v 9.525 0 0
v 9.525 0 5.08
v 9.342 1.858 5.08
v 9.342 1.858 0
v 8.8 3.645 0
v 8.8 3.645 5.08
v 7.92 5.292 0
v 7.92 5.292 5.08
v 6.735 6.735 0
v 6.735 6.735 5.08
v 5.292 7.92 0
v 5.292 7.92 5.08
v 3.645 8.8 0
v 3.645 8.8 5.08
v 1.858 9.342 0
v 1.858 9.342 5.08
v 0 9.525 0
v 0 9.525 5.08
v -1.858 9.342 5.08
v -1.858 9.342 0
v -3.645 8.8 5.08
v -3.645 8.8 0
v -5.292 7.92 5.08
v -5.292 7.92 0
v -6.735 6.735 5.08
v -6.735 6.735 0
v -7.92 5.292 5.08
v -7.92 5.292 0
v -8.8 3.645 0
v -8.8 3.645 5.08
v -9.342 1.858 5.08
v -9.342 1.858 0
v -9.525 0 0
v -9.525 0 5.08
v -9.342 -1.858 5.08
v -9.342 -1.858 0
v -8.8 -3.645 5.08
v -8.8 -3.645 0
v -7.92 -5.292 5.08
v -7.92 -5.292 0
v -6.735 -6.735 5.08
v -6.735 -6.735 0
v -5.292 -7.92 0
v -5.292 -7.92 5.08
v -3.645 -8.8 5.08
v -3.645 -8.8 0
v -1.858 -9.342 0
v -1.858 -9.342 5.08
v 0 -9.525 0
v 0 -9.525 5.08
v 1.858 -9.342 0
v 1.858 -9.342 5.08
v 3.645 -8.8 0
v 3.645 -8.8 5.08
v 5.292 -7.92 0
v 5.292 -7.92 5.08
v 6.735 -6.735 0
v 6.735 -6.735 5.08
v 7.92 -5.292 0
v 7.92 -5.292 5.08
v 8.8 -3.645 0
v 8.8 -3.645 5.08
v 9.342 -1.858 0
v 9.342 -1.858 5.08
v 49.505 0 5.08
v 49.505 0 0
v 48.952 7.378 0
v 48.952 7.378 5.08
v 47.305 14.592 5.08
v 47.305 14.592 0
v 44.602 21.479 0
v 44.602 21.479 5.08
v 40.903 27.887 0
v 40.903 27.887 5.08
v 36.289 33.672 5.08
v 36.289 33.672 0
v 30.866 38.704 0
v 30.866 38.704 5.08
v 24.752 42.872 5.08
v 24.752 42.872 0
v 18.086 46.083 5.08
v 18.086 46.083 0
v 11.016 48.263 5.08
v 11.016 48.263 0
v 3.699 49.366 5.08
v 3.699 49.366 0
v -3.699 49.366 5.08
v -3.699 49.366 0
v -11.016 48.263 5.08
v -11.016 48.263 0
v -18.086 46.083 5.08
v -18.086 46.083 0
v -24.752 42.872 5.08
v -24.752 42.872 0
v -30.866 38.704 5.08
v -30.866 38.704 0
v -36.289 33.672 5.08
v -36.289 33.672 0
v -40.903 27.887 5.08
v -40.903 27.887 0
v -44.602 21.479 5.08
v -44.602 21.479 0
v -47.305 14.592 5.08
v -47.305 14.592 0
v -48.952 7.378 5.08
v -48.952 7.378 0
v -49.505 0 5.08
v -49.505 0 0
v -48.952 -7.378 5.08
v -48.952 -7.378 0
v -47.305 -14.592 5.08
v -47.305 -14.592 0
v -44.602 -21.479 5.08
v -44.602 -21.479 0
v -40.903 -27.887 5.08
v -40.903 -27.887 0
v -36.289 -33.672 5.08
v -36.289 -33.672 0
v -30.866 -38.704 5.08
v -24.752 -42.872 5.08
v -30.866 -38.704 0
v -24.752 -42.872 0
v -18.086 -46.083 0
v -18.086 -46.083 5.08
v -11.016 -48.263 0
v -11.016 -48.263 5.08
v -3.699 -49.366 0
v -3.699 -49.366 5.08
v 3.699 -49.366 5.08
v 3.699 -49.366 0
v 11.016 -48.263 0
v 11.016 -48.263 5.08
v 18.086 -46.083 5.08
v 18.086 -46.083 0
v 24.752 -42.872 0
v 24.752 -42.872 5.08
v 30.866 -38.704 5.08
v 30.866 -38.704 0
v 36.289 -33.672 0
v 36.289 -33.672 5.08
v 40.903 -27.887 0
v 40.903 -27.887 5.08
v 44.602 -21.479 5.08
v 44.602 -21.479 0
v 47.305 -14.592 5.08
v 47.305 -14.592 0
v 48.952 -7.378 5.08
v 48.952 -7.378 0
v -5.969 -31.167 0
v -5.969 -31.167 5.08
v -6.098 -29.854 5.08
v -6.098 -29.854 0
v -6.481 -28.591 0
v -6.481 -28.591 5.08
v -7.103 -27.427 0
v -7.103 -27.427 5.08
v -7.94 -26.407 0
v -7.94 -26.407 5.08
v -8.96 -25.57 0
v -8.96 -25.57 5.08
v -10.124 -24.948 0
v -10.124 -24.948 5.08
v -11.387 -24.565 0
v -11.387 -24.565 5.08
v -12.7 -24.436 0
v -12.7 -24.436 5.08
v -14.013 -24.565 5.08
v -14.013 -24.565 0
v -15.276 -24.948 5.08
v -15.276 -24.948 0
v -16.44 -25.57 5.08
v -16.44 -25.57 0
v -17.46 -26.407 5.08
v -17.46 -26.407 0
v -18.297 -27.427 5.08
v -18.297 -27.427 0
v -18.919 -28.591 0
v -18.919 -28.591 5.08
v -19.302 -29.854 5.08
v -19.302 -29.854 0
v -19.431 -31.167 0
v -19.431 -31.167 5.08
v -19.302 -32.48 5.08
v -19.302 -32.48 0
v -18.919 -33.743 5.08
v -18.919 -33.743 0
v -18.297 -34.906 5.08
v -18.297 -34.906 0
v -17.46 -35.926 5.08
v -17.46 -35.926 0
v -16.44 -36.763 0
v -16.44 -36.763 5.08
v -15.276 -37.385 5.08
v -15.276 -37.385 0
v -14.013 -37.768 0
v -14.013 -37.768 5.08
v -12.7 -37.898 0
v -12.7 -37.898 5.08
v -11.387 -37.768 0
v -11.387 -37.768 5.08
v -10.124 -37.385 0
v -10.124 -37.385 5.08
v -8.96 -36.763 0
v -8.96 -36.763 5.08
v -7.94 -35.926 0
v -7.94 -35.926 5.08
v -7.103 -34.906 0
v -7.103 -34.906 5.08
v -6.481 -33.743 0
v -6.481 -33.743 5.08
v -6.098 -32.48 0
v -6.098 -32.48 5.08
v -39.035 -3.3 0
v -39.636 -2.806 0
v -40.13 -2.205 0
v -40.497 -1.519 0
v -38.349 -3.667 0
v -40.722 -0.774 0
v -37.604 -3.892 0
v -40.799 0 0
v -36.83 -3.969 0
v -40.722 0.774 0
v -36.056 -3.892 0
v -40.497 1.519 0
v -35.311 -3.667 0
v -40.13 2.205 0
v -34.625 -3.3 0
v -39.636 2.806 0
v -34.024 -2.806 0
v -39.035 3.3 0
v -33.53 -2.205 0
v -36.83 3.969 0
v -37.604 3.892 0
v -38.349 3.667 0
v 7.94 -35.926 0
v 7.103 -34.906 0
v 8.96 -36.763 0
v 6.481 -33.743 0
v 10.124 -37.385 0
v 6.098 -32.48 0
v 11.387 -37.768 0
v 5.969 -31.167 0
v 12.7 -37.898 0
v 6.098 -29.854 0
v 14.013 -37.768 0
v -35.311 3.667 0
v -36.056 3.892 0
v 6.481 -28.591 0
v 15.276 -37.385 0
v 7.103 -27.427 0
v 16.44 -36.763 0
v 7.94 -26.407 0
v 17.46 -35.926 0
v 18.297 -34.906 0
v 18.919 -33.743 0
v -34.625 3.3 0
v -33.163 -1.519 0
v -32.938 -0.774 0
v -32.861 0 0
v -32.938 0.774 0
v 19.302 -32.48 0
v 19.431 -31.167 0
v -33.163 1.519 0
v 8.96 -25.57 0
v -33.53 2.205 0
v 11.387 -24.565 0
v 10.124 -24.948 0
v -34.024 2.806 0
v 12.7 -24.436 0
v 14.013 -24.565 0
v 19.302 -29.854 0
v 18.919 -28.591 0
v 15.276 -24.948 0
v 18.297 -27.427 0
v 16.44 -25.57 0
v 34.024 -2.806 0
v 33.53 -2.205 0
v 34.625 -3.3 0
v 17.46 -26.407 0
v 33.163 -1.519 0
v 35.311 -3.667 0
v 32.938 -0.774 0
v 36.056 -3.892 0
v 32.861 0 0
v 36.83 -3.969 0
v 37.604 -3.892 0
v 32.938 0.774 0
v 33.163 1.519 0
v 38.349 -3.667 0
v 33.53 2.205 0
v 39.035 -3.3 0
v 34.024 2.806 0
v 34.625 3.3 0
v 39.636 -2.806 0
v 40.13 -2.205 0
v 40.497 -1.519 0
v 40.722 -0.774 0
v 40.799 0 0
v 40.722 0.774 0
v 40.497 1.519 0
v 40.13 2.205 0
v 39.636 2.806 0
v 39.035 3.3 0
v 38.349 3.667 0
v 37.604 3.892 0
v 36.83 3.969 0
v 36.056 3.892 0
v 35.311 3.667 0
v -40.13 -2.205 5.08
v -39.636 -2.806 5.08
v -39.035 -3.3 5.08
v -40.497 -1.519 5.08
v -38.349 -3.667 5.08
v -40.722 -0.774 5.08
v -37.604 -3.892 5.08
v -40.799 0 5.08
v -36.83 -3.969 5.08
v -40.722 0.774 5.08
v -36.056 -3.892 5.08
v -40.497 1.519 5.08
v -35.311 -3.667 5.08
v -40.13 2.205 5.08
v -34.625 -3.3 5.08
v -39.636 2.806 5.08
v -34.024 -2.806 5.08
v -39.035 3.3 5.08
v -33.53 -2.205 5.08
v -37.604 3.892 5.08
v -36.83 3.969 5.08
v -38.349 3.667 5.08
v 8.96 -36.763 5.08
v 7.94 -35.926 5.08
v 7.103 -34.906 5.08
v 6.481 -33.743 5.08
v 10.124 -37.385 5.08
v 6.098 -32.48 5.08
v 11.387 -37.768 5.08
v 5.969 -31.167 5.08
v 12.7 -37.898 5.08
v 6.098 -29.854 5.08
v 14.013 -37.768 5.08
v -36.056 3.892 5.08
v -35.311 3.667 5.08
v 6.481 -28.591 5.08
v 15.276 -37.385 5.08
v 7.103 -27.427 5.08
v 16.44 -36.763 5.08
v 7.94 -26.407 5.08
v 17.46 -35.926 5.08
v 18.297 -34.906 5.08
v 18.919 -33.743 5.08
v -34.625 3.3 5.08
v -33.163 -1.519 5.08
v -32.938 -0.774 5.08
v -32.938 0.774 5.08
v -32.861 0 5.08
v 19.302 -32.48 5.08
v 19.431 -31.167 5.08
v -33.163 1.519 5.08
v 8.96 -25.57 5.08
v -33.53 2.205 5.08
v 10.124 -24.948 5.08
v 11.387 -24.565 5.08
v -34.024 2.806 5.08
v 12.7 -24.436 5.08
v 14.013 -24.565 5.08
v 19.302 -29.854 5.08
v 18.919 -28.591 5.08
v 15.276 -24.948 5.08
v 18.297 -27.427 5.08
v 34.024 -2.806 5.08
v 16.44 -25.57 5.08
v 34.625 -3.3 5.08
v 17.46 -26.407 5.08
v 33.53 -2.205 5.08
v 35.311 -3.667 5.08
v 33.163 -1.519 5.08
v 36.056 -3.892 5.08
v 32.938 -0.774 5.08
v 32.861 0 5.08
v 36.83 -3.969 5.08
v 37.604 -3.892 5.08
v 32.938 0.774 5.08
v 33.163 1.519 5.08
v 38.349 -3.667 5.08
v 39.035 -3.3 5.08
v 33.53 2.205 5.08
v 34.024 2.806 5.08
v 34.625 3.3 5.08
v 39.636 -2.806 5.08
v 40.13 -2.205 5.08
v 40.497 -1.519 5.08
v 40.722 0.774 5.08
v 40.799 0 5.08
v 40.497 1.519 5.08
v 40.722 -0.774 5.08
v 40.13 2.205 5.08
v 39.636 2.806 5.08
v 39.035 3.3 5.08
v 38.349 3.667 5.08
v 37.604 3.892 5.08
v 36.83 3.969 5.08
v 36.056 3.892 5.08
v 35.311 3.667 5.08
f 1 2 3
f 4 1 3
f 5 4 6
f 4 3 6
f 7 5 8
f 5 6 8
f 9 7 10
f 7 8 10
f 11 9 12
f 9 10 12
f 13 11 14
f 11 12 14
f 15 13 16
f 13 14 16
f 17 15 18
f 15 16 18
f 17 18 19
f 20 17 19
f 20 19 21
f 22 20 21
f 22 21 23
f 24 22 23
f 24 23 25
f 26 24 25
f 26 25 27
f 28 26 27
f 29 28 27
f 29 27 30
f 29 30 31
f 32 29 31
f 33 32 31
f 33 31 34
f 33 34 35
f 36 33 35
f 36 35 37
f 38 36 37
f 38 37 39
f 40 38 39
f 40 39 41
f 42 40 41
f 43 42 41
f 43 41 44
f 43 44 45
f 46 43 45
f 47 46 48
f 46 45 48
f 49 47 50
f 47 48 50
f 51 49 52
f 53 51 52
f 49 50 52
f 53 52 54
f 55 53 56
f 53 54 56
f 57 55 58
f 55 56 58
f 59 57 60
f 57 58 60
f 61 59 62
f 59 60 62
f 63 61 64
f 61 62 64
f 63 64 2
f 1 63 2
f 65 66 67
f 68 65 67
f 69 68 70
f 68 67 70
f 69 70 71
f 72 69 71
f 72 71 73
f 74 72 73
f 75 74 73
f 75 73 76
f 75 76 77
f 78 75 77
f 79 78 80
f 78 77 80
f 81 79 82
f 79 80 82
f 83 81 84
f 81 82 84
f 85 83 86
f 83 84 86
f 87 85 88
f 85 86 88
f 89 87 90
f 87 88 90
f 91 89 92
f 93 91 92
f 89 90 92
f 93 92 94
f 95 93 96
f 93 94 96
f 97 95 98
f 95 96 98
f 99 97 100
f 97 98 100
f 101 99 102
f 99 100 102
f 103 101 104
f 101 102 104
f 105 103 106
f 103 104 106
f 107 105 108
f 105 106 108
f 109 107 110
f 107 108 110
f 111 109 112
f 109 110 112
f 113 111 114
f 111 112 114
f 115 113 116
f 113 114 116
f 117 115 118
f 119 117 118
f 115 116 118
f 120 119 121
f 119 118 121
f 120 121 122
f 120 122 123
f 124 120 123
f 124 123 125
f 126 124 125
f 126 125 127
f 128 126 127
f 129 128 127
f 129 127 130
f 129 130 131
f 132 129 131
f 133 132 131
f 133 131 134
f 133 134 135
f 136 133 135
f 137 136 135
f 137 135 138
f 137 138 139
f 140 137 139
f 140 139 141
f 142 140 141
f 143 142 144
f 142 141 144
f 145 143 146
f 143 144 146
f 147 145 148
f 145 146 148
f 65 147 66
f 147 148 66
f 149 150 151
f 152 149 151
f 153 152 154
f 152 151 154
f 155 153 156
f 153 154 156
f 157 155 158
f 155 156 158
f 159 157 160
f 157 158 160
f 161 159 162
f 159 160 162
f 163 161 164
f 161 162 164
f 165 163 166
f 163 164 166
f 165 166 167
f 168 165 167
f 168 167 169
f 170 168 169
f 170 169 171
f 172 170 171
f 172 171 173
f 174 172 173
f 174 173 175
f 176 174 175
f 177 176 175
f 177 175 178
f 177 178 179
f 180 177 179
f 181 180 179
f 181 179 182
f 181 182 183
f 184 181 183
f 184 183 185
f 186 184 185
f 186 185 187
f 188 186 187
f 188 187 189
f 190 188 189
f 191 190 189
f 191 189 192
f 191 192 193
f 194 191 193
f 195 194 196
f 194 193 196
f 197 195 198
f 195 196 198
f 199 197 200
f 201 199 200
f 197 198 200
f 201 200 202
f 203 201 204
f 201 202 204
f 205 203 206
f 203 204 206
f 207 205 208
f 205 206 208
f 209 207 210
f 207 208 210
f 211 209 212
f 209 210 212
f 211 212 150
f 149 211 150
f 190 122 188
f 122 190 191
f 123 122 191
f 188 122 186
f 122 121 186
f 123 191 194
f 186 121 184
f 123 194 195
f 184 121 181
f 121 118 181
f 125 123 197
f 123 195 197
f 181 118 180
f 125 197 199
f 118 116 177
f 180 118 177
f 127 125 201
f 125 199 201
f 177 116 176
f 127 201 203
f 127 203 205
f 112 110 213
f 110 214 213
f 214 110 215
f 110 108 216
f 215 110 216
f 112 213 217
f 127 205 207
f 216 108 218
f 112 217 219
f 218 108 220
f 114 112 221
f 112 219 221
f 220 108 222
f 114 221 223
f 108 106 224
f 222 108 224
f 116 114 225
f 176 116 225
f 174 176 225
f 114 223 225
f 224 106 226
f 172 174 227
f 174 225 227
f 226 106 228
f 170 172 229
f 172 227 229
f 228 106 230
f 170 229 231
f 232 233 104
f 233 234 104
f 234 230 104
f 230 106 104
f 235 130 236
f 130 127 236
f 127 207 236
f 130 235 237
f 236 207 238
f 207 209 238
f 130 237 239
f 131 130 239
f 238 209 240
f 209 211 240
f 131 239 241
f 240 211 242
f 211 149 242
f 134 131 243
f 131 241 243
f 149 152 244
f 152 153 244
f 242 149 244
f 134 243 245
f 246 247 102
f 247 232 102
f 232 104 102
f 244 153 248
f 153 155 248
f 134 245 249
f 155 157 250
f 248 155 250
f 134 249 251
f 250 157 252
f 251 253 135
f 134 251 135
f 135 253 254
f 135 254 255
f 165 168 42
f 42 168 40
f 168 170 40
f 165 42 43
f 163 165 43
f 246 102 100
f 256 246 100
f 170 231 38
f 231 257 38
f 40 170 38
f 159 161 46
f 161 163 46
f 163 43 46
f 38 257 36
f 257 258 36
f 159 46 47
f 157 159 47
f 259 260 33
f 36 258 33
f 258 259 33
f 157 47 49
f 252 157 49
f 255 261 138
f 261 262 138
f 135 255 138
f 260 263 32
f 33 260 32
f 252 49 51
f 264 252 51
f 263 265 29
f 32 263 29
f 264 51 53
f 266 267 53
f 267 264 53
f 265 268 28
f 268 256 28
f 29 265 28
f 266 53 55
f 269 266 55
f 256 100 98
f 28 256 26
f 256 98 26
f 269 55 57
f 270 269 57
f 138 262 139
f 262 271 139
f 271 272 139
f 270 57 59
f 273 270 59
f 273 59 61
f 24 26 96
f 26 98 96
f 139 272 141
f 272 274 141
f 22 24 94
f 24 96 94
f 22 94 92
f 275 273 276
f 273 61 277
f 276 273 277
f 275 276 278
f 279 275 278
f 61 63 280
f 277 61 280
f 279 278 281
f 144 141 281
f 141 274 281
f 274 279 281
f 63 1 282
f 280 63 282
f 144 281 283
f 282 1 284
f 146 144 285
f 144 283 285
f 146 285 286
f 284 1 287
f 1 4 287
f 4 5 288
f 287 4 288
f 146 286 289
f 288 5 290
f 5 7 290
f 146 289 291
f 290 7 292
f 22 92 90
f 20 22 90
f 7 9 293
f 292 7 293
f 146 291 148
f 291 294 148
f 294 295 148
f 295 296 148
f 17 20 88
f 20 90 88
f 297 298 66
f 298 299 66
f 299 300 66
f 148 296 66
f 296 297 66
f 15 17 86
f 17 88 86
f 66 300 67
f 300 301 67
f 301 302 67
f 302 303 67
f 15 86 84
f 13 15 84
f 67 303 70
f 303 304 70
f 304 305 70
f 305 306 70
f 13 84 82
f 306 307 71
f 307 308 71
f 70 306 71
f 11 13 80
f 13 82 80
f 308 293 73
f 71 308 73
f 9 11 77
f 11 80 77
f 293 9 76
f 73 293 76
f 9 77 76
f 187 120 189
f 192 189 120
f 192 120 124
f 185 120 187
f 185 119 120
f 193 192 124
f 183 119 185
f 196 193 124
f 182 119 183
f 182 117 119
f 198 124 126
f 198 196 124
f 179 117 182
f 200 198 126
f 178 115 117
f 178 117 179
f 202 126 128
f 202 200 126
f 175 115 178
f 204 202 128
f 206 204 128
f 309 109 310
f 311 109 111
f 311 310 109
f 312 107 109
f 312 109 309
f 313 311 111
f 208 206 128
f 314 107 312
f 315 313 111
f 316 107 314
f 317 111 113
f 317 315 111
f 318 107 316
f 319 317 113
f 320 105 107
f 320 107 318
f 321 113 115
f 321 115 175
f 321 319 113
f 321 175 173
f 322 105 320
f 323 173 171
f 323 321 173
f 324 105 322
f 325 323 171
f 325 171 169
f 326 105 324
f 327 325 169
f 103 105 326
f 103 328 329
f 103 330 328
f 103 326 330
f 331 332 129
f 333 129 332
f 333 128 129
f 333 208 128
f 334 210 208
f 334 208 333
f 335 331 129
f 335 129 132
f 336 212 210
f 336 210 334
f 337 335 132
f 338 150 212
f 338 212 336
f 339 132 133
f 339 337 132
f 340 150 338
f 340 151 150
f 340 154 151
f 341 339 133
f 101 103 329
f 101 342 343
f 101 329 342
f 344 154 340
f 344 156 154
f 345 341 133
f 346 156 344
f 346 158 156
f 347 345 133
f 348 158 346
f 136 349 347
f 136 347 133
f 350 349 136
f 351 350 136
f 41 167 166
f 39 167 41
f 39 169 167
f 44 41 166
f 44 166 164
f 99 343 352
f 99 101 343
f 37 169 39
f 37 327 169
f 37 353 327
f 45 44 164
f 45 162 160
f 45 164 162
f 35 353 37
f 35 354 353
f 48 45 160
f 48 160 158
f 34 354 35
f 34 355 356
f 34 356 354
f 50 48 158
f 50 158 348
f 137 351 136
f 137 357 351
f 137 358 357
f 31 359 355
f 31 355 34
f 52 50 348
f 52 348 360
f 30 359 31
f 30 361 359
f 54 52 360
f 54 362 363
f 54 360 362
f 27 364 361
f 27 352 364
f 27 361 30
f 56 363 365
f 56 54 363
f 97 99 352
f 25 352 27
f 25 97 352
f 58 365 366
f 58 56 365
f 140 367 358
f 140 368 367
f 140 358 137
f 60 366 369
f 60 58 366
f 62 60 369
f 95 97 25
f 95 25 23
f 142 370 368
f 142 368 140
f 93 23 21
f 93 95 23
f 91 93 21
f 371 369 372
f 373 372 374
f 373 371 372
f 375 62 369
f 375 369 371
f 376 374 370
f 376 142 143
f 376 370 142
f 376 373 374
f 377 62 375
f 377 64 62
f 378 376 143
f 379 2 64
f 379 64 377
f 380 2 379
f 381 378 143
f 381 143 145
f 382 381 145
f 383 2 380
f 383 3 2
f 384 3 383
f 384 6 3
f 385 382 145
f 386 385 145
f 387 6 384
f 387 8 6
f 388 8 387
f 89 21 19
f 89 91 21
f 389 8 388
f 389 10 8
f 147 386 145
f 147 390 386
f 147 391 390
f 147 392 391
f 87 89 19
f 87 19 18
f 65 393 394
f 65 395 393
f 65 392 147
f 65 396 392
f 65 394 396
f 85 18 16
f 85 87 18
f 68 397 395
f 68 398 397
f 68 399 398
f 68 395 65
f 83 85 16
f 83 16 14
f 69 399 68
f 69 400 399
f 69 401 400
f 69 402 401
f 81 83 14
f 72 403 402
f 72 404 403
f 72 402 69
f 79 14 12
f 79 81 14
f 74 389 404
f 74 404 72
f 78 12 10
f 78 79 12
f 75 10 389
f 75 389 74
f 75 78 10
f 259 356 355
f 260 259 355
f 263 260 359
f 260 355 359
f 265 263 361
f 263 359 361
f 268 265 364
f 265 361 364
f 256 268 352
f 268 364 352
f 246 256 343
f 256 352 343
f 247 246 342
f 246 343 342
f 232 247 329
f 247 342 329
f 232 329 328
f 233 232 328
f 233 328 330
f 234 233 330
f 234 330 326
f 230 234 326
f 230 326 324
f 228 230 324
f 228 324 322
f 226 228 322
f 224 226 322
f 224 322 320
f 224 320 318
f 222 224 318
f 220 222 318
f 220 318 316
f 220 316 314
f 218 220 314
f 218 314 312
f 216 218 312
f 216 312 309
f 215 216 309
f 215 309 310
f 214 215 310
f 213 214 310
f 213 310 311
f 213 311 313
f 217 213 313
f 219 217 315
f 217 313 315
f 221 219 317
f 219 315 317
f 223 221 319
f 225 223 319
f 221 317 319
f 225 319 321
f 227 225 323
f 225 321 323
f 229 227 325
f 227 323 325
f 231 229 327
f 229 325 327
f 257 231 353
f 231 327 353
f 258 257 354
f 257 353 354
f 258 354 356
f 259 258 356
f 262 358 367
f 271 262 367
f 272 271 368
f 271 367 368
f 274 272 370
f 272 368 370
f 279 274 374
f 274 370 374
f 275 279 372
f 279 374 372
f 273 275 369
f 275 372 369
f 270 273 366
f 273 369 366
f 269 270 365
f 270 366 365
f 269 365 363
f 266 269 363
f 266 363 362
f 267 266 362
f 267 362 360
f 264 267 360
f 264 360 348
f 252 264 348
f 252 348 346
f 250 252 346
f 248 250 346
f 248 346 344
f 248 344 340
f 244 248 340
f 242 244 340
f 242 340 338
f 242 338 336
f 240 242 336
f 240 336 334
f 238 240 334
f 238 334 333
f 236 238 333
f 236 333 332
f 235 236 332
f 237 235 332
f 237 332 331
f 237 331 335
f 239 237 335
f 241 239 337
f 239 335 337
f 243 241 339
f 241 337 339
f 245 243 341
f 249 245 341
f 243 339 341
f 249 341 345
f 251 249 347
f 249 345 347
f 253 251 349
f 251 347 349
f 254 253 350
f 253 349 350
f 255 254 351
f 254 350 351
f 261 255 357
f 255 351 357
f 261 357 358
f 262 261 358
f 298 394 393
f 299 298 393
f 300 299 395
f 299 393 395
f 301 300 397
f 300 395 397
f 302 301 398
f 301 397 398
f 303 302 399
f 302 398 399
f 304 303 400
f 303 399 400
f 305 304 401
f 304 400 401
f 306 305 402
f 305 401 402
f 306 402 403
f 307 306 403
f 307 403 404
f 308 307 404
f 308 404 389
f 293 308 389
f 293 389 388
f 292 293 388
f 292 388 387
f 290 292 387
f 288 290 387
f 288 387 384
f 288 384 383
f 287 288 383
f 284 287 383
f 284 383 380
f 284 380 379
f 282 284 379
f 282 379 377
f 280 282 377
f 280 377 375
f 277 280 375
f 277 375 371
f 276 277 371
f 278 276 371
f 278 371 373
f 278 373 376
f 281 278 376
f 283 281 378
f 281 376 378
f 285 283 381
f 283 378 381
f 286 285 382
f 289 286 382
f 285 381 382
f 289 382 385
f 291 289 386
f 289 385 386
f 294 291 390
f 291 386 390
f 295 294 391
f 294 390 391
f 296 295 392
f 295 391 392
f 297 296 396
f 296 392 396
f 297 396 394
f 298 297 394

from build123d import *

# Parameters (mm, degrees)
SKETCH1_R           = 49.5046
BOSS_EXTRUDE1_DEPTH = 5.08
SKETCH2_R           = 47.625
BOSS_EXTRUDE2_DEPTH = 3.175
SKETCH3_R           = 6.731
SKETCH3_R_2         = 3.96875
SKETCH3_R_3         = 9.525
CUT_EXTRUDE1_DEPTH  = 9.255
SKETCH4_R           = 55.708104083
CUT_EXTRUDE2_DEPTH  = 3.175


with BuildPart() as part:
    # Sketch1 → Boss-Extrude1 (new body)
    with BuildSketch(Plane.XY):
        Circle(SKETCH1_R)
    extrude(amount=BOSS_EXTRUDE1_DEPTH)

    # Sketch2 → Boss-Extrude2 (add)
    with BuildSketch(Plane.XY.offset(5.08)):
        Circle(SKETCH2_R)
    extrude(amount=BOSS_EXTRUDE2_DEPTH)

    # Sketch3 → Cut-Extrude1 (cut, through all)
    with BuildSketch(Plane.XY.offset(8.255)):
        with Locations((-12.7, -31.166793627)):
            Circle(SKETCH3_R)
        with Locations((12.7, -31.166793627)):
            Circle(SKETCH3_R)
        with Locations((-36.83, 0)):
            Circle(SKETCH3_R_2)
        with Locations((36.83, 0)):
            Circle(SKETCH3_R_2)
        Circle(SKETCH3_R_3)
    extrude(amount=-CUT_EXTRUDE1_DEPTH, mode=Mode.SUBTRACT)

    # Sketch4 → Cut-Extrude2 (cut)
    with BuildSketch(Plane.XY.offset(8.255)):
        Circle(SKETCH4_R)
    extrude(amount=-CUT_EXTRUDE2_DEPTH, mode=Mode.SUBTRACT)


solid = part.part
